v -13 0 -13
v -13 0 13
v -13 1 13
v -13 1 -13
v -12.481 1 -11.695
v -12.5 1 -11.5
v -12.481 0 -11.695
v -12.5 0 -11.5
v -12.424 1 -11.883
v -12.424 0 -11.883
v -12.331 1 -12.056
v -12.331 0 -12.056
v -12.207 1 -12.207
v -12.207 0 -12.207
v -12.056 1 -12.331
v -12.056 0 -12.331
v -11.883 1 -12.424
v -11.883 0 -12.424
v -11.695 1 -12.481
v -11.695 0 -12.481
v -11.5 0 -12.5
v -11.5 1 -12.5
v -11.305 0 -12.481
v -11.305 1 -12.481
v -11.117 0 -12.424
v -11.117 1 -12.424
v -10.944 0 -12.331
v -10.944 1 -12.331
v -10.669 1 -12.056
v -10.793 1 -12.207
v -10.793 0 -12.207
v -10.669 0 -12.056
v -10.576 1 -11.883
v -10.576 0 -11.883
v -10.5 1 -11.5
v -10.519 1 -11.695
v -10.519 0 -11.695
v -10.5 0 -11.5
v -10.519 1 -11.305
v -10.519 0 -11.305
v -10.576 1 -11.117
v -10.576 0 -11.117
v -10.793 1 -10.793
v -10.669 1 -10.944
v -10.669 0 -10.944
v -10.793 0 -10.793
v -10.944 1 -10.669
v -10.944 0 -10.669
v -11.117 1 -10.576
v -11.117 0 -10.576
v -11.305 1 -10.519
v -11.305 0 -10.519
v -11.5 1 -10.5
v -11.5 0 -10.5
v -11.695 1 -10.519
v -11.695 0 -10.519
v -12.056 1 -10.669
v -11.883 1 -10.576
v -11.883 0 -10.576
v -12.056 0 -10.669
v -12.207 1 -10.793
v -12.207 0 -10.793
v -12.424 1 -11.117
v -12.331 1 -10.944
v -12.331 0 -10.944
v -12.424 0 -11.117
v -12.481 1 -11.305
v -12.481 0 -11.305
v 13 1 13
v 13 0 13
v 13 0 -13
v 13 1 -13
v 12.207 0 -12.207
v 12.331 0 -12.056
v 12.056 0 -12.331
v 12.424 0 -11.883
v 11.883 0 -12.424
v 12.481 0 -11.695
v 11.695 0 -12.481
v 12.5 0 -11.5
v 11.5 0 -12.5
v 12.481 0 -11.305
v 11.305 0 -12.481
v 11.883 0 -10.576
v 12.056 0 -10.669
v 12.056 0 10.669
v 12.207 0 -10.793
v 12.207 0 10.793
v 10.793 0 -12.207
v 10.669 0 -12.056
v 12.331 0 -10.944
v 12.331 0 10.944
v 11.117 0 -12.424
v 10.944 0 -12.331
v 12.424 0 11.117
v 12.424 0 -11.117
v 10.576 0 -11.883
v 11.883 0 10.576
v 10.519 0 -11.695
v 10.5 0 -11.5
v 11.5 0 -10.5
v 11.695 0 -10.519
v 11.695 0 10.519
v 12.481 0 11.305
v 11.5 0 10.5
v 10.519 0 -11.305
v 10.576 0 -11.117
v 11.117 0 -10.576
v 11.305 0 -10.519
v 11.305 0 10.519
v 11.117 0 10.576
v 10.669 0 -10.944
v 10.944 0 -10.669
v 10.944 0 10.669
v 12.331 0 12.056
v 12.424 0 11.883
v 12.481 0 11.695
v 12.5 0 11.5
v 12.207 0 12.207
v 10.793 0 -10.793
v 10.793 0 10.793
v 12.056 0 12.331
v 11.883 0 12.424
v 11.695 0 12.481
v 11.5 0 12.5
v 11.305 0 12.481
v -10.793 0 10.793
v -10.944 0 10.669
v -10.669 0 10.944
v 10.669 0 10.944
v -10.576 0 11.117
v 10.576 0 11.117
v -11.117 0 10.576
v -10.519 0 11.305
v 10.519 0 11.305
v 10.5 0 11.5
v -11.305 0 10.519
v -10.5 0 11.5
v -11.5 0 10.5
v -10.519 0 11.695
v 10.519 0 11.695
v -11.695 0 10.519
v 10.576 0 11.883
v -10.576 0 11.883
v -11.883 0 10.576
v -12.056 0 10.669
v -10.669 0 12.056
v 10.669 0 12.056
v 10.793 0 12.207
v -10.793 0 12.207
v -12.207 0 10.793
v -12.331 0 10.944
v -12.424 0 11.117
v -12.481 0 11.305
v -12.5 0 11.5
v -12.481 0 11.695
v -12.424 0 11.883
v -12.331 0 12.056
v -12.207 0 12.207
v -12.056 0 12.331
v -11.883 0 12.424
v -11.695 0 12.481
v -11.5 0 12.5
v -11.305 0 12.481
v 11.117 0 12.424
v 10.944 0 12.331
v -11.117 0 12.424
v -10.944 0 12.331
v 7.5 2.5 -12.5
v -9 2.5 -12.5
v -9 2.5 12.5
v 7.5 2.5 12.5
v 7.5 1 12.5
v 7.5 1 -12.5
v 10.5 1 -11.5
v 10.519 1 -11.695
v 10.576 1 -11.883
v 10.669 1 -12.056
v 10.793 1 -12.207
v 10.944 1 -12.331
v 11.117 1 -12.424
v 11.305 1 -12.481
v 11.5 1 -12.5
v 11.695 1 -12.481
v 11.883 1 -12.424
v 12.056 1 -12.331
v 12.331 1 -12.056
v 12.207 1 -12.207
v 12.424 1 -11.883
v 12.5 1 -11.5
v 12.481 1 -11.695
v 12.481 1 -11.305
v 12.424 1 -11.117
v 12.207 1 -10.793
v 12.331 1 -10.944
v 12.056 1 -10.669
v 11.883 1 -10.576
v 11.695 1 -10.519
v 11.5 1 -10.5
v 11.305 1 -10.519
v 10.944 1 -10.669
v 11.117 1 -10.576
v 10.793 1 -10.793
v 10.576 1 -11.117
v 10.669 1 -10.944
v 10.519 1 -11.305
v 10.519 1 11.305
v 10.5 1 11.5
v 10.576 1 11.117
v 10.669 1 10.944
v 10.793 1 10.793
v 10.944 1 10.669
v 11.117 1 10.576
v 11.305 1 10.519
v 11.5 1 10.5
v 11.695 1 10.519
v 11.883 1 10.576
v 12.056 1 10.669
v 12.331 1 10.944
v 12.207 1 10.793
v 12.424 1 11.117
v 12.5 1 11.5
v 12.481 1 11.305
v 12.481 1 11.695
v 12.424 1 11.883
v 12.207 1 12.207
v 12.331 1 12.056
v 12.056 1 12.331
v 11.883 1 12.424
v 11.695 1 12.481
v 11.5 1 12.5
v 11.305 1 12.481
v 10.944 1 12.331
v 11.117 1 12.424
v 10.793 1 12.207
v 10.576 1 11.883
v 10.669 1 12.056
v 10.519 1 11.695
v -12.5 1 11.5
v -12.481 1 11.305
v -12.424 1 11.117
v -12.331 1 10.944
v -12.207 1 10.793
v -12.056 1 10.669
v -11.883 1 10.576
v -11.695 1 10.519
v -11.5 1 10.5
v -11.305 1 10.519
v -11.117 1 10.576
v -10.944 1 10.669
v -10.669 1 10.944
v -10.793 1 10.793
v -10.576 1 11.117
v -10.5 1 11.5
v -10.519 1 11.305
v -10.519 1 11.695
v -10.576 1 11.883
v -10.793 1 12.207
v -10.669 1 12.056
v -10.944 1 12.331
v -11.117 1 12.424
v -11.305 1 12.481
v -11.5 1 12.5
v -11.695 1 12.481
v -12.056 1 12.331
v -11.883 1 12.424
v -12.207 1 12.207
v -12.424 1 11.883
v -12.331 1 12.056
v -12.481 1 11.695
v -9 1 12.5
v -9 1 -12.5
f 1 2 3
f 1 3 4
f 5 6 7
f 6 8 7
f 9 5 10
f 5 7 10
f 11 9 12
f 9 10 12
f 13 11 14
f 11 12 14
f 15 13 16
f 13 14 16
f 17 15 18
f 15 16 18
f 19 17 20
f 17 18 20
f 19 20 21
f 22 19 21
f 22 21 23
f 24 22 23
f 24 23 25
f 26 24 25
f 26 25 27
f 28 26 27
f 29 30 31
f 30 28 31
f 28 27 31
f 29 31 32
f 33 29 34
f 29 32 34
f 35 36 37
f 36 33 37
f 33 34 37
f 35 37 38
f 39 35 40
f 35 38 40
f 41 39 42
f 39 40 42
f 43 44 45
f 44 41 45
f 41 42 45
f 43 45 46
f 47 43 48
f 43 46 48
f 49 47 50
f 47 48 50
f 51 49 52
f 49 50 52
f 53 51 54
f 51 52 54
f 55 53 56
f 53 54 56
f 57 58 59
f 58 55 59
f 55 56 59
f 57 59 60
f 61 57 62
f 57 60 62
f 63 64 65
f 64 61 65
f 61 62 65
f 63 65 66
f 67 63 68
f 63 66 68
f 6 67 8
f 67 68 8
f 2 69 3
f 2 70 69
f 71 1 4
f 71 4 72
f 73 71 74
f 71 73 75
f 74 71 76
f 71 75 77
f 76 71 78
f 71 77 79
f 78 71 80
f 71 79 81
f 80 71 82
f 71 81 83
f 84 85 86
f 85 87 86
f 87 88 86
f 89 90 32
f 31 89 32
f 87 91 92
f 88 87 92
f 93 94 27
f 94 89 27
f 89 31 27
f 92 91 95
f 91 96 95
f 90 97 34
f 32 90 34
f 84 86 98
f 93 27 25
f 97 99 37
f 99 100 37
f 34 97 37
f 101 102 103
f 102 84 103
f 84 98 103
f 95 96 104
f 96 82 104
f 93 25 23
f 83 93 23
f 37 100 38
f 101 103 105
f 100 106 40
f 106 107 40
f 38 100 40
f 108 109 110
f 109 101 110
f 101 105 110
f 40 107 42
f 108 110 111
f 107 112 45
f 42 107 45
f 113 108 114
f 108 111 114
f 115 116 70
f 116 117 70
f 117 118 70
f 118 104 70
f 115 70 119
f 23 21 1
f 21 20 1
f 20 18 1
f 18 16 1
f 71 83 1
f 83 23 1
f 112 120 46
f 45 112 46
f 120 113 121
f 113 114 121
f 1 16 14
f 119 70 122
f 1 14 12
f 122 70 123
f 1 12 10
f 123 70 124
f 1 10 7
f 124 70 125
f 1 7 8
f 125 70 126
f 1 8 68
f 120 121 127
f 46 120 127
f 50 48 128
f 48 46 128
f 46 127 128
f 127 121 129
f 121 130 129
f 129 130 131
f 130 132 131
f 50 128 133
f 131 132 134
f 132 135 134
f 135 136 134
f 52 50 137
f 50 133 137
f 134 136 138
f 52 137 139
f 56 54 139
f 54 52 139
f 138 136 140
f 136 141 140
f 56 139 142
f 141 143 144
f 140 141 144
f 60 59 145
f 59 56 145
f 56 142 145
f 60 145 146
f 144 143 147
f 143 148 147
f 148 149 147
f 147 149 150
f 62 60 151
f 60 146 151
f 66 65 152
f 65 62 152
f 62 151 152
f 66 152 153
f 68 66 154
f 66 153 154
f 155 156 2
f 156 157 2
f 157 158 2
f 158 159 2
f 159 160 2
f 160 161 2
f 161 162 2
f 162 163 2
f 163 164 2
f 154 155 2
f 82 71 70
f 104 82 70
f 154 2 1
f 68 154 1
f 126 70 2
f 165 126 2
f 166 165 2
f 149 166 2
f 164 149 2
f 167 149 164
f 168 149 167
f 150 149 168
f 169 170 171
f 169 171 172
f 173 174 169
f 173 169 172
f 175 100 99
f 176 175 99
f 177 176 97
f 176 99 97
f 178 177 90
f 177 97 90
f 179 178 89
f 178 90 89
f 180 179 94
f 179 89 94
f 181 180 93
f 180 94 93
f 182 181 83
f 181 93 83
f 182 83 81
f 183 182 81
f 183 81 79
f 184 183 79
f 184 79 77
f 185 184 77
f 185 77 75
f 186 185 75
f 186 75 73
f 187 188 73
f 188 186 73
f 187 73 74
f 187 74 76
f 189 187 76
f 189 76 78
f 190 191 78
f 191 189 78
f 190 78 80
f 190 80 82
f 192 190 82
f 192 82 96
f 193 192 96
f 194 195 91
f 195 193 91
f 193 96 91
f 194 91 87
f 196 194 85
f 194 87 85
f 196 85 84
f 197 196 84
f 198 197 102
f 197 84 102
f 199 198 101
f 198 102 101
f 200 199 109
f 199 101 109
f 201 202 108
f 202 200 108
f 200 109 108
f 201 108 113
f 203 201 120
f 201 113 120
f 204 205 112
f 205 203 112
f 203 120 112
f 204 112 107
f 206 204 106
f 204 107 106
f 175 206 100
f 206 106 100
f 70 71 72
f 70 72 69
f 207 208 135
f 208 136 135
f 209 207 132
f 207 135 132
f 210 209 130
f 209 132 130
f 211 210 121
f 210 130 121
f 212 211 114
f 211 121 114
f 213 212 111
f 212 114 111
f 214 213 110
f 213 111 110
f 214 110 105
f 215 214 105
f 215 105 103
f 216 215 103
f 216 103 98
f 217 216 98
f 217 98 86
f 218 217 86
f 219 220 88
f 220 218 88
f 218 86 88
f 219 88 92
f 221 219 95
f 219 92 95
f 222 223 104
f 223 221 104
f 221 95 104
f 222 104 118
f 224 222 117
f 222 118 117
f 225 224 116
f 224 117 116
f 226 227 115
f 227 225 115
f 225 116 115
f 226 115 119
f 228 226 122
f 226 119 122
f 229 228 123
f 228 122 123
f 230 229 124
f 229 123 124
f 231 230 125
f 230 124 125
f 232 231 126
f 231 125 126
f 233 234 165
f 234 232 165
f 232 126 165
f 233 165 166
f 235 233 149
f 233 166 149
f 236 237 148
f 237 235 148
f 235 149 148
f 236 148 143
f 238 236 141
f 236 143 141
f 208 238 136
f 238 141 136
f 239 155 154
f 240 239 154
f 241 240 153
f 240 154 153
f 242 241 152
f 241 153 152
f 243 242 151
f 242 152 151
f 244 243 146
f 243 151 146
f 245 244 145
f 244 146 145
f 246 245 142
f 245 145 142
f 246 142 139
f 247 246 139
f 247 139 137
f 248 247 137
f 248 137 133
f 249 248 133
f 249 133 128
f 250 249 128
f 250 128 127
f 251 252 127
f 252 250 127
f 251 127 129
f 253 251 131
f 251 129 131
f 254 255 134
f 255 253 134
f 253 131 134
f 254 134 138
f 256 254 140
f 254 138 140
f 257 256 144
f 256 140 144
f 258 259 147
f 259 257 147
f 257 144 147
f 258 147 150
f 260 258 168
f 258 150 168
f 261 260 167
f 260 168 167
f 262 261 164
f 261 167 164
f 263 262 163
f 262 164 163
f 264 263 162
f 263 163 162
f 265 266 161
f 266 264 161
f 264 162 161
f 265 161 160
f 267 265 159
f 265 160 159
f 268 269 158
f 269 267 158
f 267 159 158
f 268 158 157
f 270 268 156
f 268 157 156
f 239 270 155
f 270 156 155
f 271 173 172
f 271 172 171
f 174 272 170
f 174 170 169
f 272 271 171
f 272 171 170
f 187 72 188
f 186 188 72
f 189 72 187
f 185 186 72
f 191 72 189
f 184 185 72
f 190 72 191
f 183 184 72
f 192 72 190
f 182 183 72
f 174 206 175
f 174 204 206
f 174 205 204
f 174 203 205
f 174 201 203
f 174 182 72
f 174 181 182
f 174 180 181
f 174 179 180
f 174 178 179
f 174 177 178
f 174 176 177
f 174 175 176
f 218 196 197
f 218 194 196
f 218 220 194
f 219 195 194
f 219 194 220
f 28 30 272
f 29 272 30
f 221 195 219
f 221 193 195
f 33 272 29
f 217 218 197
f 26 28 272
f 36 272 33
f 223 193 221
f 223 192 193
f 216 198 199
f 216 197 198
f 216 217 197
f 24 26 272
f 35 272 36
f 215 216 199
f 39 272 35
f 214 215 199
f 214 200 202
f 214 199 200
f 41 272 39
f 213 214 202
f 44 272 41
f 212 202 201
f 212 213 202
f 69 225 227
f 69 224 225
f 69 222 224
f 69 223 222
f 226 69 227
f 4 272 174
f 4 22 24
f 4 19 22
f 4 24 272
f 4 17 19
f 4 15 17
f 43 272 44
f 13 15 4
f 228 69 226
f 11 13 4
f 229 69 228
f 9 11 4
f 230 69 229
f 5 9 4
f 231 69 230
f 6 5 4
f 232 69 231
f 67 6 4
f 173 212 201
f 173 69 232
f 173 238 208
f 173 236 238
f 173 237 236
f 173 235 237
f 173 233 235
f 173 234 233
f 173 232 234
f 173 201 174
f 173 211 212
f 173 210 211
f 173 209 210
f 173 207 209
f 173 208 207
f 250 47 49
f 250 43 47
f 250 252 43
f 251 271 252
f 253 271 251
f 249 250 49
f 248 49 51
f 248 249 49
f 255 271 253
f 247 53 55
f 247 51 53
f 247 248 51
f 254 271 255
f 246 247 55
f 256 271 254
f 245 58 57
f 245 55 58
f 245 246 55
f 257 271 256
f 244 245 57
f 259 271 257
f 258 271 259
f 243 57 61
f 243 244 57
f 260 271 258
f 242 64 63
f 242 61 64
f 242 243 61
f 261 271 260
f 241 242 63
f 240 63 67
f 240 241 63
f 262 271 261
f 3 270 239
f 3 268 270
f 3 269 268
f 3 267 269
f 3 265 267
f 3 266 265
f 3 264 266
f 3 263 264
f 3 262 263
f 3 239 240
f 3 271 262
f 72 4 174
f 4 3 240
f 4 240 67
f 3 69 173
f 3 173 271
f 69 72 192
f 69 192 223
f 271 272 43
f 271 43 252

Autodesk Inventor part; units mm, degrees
ref_plane "YZ Plane" through (0, 0, 0) normal (1, 0, 0) x (0, 1, 0)
ref_plane "XZ Plane" through (0, 0, 0) normal (0, 1, 0) x (-1, 0, 0)
ref_plane "XY Plane" through (0, 0, 0) normal (0, 0, 1) x (1, 0, 0)
sketch "Sketch1" plane through (0, 0, 0) normal (0, 1, 0) x (-1, 0, 0)
  line L0 (-13, 13) -> (13, 13)
  line L1 (13, 13) -> (13, -13)
  line L2 (13, -13) -> (-13, -13)
  line L3 (-13, -13) -> (-13, 13)
  line L4 (-13, 13) -> (13, -13) construction
  line L5 (13, 13) -> (-13, -13) construction
  circle A0 centre (11.5, 11.5) radius 1
  line L6 (0, 0) -> (3.4228, 0) construction
  line L7 (0, 0) -> (0, 5.3357) construction
  circle A1 centre (11.5, -11.5) radius 1
  circle A2 centre (-11.5, 11.5) radius 1
  circle A3 centre (-11.5, -11.5) radius 1
  dimension "d0" = 26
  dimension "d1" = 26
  dimension "d2" = 2
  dimension "d3" = 1.5
extrude "Extrusion1" add sketch "Sketch1" along normal blind 1
sketch "Sketch2" plane through (0, 1, 0) normal (0, 1, 0) x (1, 0, 0)
  line L0 (-13, 13) -> (-13, -13) construction
  line L1 (0, 0) -> (-10.4427, 0) construction
  line L2 (7.5, -12.5) -> (-9, -12.5)
  line L3 (-9, -12.5) -> (-9, 12.5)
  line L4 (-9, 12.5) -> (7.5, 12.5)
  line L5 (7.5, 12.5) -> (7.5, -12.5)
  line L6 (7.5, -12.5) -> (-9, 12.5) construction
  line L7 (-9, -12.5) -> (7.5, 12.5) construction
  point P0 (-0.75, 0)
  dimension "d6" = 16.5
  dimension "d7" = 25
  dimension "d8" = 4
extrude "Extrusion2" add sketch "Sketch2" along normal blind 1.5
properties part number "Screen"
